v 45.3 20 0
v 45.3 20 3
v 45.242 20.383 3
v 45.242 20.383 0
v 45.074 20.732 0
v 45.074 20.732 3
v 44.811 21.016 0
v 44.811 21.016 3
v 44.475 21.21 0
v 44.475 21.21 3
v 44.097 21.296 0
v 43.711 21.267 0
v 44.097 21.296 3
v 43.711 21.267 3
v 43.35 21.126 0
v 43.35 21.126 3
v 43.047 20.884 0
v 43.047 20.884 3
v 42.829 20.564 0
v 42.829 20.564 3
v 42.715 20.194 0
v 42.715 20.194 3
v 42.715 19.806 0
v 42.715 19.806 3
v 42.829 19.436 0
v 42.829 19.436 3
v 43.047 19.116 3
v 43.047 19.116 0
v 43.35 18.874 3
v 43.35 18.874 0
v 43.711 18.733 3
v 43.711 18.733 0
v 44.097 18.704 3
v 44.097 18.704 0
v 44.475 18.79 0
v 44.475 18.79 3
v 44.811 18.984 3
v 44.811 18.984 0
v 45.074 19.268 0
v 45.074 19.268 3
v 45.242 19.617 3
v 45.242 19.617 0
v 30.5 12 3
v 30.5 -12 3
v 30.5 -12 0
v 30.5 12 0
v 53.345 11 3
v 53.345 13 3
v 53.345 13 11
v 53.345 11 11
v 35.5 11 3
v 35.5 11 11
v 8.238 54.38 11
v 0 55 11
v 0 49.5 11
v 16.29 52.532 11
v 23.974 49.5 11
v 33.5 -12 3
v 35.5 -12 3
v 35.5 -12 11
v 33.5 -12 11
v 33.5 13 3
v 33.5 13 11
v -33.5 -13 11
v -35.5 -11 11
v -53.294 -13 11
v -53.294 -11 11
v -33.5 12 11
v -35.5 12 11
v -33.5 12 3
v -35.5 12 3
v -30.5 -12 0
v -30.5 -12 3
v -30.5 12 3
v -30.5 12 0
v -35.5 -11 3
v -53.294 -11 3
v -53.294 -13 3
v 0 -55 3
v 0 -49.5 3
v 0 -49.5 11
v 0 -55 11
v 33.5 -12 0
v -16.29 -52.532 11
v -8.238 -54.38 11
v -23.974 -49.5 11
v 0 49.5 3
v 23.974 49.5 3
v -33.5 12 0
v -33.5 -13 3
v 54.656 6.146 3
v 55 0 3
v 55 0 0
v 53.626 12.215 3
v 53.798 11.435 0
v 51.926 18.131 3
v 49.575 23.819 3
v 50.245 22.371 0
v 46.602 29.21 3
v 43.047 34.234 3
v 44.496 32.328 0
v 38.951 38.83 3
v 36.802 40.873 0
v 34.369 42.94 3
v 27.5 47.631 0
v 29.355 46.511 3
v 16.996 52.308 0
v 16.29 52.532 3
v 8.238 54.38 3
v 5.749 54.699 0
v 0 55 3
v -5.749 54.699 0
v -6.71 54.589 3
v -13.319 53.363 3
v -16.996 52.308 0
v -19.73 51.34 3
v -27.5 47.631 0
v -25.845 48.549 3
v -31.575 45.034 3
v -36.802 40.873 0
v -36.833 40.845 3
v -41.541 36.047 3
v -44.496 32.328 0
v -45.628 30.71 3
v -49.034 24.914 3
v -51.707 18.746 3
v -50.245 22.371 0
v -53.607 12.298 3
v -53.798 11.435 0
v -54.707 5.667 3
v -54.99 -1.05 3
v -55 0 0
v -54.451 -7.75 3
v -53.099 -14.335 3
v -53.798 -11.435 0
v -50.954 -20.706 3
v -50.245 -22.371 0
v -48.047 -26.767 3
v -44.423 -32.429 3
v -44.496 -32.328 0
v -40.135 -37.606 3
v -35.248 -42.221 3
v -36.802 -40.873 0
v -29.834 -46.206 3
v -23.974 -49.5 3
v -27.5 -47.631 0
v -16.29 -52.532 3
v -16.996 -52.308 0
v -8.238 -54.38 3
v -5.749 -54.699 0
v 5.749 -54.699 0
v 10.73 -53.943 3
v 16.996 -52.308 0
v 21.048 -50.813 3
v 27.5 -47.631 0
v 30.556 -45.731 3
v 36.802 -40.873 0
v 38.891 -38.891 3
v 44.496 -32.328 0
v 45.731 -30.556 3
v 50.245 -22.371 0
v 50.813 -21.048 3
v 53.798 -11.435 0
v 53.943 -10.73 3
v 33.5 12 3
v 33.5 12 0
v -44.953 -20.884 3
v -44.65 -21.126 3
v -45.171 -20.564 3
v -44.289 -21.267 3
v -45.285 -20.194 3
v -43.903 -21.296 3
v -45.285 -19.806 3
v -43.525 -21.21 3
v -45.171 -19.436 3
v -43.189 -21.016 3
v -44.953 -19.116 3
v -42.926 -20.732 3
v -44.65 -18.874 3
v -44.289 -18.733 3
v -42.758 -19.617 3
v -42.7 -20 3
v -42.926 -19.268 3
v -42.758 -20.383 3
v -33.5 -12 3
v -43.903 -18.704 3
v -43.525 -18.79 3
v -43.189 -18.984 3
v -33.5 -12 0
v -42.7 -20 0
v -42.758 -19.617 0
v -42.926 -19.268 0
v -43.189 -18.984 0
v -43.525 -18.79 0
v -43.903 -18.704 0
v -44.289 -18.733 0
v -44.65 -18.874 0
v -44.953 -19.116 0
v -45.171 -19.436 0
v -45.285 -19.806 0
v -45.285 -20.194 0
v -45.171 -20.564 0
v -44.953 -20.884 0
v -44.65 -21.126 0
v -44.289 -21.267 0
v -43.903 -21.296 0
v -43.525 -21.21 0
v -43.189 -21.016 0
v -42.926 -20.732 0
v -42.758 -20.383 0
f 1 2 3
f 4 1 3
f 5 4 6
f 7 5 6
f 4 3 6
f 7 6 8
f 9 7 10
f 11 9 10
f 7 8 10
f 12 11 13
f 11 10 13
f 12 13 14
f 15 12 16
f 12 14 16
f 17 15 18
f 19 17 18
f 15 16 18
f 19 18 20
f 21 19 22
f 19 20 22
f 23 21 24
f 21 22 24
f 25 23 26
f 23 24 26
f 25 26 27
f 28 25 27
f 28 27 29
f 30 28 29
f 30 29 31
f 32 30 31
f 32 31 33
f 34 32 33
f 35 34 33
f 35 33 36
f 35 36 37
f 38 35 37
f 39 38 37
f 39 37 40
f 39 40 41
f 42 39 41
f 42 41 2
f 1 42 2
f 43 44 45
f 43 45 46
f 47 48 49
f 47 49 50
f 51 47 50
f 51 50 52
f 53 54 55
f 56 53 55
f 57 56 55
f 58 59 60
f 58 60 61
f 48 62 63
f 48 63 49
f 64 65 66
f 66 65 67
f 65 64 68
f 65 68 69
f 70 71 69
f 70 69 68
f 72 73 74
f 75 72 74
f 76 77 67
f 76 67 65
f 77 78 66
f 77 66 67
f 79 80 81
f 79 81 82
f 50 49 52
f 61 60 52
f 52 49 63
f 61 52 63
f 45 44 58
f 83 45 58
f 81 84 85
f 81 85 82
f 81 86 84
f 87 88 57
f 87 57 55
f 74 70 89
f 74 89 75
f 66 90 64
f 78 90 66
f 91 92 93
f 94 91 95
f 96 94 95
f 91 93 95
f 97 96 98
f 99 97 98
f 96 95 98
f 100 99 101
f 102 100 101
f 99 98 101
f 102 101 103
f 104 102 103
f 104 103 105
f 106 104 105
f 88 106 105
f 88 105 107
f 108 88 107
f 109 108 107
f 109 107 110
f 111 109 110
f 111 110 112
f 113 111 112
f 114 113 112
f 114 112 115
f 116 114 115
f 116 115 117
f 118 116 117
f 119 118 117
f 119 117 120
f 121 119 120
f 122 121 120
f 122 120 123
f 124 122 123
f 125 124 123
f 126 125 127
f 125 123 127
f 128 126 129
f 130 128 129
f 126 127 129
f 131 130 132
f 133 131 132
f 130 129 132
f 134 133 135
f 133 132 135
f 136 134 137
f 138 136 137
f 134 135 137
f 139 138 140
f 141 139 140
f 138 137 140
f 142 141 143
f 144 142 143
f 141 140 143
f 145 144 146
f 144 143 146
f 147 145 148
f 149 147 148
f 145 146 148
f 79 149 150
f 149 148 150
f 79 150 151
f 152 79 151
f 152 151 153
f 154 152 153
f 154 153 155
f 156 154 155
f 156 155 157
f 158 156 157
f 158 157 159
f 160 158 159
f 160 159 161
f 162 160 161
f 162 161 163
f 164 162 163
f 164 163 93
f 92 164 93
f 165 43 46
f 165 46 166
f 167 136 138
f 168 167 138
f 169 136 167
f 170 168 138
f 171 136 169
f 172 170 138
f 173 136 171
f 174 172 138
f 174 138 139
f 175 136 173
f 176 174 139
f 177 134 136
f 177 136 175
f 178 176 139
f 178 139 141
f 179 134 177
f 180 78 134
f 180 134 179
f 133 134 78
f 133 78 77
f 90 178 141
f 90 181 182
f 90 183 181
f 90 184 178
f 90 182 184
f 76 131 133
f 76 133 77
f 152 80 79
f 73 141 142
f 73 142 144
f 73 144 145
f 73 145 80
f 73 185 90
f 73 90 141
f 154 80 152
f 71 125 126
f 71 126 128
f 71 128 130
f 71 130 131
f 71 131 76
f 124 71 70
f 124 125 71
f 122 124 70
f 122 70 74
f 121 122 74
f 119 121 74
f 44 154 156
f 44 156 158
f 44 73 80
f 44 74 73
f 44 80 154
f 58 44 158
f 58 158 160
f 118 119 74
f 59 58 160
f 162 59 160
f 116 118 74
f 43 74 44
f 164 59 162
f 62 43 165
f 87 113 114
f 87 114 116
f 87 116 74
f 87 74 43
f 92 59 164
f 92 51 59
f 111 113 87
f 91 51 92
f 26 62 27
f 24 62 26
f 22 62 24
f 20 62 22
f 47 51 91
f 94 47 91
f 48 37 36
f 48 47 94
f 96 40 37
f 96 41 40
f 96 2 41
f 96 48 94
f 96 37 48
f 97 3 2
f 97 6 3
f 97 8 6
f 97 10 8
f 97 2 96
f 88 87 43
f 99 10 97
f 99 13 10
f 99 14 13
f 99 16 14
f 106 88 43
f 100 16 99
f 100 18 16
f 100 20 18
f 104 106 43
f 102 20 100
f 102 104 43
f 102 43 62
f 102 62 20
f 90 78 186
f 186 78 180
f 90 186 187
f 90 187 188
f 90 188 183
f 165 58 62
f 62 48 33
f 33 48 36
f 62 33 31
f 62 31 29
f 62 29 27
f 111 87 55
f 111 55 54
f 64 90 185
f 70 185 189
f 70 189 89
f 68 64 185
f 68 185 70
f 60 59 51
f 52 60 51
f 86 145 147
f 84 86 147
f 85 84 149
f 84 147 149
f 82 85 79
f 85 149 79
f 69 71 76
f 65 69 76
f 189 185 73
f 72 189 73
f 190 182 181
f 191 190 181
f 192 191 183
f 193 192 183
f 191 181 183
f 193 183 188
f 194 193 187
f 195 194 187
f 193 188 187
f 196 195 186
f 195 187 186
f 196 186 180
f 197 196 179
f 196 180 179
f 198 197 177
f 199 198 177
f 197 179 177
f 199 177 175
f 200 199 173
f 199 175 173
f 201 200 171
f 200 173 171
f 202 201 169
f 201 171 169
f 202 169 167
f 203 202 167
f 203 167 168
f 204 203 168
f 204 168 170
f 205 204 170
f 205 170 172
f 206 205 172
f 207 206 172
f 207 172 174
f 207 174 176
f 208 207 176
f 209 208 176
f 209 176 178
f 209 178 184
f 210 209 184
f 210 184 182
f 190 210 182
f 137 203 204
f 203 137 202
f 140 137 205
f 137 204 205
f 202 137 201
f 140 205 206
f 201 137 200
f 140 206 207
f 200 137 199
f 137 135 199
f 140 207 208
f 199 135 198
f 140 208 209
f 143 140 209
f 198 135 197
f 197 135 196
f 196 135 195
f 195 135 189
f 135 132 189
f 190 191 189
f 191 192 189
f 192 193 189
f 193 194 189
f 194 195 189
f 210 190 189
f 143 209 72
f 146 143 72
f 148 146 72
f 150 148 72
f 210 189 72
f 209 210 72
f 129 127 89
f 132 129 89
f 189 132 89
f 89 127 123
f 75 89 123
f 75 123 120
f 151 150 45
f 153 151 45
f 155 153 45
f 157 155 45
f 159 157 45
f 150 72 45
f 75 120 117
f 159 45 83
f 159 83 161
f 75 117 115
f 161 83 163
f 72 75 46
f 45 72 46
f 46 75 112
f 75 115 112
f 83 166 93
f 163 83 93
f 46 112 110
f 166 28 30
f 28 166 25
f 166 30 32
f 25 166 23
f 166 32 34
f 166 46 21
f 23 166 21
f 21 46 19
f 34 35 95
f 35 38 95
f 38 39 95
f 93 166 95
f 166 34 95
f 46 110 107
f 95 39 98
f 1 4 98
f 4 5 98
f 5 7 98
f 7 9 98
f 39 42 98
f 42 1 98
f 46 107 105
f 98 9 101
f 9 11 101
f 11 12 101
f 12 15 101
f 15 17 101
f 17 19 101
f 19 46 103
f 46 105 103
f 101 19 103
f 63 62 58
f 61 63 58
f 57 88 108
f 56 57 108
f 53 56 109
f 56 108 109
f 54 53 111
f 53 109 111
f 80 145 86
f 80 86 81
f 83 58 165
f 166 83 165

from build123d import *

# Parameters (mm, degrees)
SKETCH_R     = 55
PAD_DEPTH    = 3
PAD001_DEPTH = 8
PAD002_DEPTH = 8
SKETCH003_R  = 1.3
SKETCH003_W  = 3
SKETCH003_H  = 24
POCKET_DEPTH = 5


with BuildPart() as part:
    # Sketch → Pad (new body)
    with BuildSketch(Plane.XY):
        Circle(SKETCH_R)
    extrude(amount=PAD_DEPTH)

    # Sketch001 (on Face3 of Pad) → Pad001 (join)
    with BuildSketch(Plane.XY.offset(3)):
        Polygon((33.500008, 0), (33.500008, 13), (53.345406, 13), (53.345406, 11), (35.5, 11), (35.5, -0.005684), (35.5, -12), (33.500008, -12), align=None)
        Polygon((-33.5, 0), (-33.5, -13), (-53.293575, -13), (-53.293575, -11), (-35.5, -11), (-35.5, 0.001212), (-35.5, 12), (-33.5, 12), align=None)
    extrude(amount=PAD001_DEPTH)

    # Sketch002 (on Face3 of Pad001) → Pad002 (join)
    with BuildSketch(Plane.XY.offset(3)):
        with BuildLine():
            ThreePointArc((-23.973944, -49.5), (-12.298374, -53.607369), (0, -55))
            Line((0, -49.5), (0, -55))
            Line((-23.973944, -49.5), (0, -49.5))
        make_face()
        with BuildLine():
            ThreePointArc((23.973944, 49.5), (12.298374, 53.607369), (0, 55))
            Line((0, 49.5), (0, 55))
            Line((23.973944, 49.5), (0, 49.5))
        make_face()
    extrude(amount=PAD002_DEPTH)

    # Sketch003 (on Face3 of Pad002) → Pocket (cut)
    with BuildSketch(Plane.XY.offset(3)):
        with Locations((-44, -20)):
            Circle(SKETCH003_R)
        with Locations((44, 20)):
            Circle(SKETCH003_R)
        with Locations((32, 0)):
            Rectangle(SKETCH003_W, SKETCH003_H)
        with Locations((-32, 0)):
            Rectangle(SKETCH003_W, SKETCH003_H)
    extrude(amount=-POCKET_DEPTH, mode=Mode.SUBTRACT)


solid = part.part
